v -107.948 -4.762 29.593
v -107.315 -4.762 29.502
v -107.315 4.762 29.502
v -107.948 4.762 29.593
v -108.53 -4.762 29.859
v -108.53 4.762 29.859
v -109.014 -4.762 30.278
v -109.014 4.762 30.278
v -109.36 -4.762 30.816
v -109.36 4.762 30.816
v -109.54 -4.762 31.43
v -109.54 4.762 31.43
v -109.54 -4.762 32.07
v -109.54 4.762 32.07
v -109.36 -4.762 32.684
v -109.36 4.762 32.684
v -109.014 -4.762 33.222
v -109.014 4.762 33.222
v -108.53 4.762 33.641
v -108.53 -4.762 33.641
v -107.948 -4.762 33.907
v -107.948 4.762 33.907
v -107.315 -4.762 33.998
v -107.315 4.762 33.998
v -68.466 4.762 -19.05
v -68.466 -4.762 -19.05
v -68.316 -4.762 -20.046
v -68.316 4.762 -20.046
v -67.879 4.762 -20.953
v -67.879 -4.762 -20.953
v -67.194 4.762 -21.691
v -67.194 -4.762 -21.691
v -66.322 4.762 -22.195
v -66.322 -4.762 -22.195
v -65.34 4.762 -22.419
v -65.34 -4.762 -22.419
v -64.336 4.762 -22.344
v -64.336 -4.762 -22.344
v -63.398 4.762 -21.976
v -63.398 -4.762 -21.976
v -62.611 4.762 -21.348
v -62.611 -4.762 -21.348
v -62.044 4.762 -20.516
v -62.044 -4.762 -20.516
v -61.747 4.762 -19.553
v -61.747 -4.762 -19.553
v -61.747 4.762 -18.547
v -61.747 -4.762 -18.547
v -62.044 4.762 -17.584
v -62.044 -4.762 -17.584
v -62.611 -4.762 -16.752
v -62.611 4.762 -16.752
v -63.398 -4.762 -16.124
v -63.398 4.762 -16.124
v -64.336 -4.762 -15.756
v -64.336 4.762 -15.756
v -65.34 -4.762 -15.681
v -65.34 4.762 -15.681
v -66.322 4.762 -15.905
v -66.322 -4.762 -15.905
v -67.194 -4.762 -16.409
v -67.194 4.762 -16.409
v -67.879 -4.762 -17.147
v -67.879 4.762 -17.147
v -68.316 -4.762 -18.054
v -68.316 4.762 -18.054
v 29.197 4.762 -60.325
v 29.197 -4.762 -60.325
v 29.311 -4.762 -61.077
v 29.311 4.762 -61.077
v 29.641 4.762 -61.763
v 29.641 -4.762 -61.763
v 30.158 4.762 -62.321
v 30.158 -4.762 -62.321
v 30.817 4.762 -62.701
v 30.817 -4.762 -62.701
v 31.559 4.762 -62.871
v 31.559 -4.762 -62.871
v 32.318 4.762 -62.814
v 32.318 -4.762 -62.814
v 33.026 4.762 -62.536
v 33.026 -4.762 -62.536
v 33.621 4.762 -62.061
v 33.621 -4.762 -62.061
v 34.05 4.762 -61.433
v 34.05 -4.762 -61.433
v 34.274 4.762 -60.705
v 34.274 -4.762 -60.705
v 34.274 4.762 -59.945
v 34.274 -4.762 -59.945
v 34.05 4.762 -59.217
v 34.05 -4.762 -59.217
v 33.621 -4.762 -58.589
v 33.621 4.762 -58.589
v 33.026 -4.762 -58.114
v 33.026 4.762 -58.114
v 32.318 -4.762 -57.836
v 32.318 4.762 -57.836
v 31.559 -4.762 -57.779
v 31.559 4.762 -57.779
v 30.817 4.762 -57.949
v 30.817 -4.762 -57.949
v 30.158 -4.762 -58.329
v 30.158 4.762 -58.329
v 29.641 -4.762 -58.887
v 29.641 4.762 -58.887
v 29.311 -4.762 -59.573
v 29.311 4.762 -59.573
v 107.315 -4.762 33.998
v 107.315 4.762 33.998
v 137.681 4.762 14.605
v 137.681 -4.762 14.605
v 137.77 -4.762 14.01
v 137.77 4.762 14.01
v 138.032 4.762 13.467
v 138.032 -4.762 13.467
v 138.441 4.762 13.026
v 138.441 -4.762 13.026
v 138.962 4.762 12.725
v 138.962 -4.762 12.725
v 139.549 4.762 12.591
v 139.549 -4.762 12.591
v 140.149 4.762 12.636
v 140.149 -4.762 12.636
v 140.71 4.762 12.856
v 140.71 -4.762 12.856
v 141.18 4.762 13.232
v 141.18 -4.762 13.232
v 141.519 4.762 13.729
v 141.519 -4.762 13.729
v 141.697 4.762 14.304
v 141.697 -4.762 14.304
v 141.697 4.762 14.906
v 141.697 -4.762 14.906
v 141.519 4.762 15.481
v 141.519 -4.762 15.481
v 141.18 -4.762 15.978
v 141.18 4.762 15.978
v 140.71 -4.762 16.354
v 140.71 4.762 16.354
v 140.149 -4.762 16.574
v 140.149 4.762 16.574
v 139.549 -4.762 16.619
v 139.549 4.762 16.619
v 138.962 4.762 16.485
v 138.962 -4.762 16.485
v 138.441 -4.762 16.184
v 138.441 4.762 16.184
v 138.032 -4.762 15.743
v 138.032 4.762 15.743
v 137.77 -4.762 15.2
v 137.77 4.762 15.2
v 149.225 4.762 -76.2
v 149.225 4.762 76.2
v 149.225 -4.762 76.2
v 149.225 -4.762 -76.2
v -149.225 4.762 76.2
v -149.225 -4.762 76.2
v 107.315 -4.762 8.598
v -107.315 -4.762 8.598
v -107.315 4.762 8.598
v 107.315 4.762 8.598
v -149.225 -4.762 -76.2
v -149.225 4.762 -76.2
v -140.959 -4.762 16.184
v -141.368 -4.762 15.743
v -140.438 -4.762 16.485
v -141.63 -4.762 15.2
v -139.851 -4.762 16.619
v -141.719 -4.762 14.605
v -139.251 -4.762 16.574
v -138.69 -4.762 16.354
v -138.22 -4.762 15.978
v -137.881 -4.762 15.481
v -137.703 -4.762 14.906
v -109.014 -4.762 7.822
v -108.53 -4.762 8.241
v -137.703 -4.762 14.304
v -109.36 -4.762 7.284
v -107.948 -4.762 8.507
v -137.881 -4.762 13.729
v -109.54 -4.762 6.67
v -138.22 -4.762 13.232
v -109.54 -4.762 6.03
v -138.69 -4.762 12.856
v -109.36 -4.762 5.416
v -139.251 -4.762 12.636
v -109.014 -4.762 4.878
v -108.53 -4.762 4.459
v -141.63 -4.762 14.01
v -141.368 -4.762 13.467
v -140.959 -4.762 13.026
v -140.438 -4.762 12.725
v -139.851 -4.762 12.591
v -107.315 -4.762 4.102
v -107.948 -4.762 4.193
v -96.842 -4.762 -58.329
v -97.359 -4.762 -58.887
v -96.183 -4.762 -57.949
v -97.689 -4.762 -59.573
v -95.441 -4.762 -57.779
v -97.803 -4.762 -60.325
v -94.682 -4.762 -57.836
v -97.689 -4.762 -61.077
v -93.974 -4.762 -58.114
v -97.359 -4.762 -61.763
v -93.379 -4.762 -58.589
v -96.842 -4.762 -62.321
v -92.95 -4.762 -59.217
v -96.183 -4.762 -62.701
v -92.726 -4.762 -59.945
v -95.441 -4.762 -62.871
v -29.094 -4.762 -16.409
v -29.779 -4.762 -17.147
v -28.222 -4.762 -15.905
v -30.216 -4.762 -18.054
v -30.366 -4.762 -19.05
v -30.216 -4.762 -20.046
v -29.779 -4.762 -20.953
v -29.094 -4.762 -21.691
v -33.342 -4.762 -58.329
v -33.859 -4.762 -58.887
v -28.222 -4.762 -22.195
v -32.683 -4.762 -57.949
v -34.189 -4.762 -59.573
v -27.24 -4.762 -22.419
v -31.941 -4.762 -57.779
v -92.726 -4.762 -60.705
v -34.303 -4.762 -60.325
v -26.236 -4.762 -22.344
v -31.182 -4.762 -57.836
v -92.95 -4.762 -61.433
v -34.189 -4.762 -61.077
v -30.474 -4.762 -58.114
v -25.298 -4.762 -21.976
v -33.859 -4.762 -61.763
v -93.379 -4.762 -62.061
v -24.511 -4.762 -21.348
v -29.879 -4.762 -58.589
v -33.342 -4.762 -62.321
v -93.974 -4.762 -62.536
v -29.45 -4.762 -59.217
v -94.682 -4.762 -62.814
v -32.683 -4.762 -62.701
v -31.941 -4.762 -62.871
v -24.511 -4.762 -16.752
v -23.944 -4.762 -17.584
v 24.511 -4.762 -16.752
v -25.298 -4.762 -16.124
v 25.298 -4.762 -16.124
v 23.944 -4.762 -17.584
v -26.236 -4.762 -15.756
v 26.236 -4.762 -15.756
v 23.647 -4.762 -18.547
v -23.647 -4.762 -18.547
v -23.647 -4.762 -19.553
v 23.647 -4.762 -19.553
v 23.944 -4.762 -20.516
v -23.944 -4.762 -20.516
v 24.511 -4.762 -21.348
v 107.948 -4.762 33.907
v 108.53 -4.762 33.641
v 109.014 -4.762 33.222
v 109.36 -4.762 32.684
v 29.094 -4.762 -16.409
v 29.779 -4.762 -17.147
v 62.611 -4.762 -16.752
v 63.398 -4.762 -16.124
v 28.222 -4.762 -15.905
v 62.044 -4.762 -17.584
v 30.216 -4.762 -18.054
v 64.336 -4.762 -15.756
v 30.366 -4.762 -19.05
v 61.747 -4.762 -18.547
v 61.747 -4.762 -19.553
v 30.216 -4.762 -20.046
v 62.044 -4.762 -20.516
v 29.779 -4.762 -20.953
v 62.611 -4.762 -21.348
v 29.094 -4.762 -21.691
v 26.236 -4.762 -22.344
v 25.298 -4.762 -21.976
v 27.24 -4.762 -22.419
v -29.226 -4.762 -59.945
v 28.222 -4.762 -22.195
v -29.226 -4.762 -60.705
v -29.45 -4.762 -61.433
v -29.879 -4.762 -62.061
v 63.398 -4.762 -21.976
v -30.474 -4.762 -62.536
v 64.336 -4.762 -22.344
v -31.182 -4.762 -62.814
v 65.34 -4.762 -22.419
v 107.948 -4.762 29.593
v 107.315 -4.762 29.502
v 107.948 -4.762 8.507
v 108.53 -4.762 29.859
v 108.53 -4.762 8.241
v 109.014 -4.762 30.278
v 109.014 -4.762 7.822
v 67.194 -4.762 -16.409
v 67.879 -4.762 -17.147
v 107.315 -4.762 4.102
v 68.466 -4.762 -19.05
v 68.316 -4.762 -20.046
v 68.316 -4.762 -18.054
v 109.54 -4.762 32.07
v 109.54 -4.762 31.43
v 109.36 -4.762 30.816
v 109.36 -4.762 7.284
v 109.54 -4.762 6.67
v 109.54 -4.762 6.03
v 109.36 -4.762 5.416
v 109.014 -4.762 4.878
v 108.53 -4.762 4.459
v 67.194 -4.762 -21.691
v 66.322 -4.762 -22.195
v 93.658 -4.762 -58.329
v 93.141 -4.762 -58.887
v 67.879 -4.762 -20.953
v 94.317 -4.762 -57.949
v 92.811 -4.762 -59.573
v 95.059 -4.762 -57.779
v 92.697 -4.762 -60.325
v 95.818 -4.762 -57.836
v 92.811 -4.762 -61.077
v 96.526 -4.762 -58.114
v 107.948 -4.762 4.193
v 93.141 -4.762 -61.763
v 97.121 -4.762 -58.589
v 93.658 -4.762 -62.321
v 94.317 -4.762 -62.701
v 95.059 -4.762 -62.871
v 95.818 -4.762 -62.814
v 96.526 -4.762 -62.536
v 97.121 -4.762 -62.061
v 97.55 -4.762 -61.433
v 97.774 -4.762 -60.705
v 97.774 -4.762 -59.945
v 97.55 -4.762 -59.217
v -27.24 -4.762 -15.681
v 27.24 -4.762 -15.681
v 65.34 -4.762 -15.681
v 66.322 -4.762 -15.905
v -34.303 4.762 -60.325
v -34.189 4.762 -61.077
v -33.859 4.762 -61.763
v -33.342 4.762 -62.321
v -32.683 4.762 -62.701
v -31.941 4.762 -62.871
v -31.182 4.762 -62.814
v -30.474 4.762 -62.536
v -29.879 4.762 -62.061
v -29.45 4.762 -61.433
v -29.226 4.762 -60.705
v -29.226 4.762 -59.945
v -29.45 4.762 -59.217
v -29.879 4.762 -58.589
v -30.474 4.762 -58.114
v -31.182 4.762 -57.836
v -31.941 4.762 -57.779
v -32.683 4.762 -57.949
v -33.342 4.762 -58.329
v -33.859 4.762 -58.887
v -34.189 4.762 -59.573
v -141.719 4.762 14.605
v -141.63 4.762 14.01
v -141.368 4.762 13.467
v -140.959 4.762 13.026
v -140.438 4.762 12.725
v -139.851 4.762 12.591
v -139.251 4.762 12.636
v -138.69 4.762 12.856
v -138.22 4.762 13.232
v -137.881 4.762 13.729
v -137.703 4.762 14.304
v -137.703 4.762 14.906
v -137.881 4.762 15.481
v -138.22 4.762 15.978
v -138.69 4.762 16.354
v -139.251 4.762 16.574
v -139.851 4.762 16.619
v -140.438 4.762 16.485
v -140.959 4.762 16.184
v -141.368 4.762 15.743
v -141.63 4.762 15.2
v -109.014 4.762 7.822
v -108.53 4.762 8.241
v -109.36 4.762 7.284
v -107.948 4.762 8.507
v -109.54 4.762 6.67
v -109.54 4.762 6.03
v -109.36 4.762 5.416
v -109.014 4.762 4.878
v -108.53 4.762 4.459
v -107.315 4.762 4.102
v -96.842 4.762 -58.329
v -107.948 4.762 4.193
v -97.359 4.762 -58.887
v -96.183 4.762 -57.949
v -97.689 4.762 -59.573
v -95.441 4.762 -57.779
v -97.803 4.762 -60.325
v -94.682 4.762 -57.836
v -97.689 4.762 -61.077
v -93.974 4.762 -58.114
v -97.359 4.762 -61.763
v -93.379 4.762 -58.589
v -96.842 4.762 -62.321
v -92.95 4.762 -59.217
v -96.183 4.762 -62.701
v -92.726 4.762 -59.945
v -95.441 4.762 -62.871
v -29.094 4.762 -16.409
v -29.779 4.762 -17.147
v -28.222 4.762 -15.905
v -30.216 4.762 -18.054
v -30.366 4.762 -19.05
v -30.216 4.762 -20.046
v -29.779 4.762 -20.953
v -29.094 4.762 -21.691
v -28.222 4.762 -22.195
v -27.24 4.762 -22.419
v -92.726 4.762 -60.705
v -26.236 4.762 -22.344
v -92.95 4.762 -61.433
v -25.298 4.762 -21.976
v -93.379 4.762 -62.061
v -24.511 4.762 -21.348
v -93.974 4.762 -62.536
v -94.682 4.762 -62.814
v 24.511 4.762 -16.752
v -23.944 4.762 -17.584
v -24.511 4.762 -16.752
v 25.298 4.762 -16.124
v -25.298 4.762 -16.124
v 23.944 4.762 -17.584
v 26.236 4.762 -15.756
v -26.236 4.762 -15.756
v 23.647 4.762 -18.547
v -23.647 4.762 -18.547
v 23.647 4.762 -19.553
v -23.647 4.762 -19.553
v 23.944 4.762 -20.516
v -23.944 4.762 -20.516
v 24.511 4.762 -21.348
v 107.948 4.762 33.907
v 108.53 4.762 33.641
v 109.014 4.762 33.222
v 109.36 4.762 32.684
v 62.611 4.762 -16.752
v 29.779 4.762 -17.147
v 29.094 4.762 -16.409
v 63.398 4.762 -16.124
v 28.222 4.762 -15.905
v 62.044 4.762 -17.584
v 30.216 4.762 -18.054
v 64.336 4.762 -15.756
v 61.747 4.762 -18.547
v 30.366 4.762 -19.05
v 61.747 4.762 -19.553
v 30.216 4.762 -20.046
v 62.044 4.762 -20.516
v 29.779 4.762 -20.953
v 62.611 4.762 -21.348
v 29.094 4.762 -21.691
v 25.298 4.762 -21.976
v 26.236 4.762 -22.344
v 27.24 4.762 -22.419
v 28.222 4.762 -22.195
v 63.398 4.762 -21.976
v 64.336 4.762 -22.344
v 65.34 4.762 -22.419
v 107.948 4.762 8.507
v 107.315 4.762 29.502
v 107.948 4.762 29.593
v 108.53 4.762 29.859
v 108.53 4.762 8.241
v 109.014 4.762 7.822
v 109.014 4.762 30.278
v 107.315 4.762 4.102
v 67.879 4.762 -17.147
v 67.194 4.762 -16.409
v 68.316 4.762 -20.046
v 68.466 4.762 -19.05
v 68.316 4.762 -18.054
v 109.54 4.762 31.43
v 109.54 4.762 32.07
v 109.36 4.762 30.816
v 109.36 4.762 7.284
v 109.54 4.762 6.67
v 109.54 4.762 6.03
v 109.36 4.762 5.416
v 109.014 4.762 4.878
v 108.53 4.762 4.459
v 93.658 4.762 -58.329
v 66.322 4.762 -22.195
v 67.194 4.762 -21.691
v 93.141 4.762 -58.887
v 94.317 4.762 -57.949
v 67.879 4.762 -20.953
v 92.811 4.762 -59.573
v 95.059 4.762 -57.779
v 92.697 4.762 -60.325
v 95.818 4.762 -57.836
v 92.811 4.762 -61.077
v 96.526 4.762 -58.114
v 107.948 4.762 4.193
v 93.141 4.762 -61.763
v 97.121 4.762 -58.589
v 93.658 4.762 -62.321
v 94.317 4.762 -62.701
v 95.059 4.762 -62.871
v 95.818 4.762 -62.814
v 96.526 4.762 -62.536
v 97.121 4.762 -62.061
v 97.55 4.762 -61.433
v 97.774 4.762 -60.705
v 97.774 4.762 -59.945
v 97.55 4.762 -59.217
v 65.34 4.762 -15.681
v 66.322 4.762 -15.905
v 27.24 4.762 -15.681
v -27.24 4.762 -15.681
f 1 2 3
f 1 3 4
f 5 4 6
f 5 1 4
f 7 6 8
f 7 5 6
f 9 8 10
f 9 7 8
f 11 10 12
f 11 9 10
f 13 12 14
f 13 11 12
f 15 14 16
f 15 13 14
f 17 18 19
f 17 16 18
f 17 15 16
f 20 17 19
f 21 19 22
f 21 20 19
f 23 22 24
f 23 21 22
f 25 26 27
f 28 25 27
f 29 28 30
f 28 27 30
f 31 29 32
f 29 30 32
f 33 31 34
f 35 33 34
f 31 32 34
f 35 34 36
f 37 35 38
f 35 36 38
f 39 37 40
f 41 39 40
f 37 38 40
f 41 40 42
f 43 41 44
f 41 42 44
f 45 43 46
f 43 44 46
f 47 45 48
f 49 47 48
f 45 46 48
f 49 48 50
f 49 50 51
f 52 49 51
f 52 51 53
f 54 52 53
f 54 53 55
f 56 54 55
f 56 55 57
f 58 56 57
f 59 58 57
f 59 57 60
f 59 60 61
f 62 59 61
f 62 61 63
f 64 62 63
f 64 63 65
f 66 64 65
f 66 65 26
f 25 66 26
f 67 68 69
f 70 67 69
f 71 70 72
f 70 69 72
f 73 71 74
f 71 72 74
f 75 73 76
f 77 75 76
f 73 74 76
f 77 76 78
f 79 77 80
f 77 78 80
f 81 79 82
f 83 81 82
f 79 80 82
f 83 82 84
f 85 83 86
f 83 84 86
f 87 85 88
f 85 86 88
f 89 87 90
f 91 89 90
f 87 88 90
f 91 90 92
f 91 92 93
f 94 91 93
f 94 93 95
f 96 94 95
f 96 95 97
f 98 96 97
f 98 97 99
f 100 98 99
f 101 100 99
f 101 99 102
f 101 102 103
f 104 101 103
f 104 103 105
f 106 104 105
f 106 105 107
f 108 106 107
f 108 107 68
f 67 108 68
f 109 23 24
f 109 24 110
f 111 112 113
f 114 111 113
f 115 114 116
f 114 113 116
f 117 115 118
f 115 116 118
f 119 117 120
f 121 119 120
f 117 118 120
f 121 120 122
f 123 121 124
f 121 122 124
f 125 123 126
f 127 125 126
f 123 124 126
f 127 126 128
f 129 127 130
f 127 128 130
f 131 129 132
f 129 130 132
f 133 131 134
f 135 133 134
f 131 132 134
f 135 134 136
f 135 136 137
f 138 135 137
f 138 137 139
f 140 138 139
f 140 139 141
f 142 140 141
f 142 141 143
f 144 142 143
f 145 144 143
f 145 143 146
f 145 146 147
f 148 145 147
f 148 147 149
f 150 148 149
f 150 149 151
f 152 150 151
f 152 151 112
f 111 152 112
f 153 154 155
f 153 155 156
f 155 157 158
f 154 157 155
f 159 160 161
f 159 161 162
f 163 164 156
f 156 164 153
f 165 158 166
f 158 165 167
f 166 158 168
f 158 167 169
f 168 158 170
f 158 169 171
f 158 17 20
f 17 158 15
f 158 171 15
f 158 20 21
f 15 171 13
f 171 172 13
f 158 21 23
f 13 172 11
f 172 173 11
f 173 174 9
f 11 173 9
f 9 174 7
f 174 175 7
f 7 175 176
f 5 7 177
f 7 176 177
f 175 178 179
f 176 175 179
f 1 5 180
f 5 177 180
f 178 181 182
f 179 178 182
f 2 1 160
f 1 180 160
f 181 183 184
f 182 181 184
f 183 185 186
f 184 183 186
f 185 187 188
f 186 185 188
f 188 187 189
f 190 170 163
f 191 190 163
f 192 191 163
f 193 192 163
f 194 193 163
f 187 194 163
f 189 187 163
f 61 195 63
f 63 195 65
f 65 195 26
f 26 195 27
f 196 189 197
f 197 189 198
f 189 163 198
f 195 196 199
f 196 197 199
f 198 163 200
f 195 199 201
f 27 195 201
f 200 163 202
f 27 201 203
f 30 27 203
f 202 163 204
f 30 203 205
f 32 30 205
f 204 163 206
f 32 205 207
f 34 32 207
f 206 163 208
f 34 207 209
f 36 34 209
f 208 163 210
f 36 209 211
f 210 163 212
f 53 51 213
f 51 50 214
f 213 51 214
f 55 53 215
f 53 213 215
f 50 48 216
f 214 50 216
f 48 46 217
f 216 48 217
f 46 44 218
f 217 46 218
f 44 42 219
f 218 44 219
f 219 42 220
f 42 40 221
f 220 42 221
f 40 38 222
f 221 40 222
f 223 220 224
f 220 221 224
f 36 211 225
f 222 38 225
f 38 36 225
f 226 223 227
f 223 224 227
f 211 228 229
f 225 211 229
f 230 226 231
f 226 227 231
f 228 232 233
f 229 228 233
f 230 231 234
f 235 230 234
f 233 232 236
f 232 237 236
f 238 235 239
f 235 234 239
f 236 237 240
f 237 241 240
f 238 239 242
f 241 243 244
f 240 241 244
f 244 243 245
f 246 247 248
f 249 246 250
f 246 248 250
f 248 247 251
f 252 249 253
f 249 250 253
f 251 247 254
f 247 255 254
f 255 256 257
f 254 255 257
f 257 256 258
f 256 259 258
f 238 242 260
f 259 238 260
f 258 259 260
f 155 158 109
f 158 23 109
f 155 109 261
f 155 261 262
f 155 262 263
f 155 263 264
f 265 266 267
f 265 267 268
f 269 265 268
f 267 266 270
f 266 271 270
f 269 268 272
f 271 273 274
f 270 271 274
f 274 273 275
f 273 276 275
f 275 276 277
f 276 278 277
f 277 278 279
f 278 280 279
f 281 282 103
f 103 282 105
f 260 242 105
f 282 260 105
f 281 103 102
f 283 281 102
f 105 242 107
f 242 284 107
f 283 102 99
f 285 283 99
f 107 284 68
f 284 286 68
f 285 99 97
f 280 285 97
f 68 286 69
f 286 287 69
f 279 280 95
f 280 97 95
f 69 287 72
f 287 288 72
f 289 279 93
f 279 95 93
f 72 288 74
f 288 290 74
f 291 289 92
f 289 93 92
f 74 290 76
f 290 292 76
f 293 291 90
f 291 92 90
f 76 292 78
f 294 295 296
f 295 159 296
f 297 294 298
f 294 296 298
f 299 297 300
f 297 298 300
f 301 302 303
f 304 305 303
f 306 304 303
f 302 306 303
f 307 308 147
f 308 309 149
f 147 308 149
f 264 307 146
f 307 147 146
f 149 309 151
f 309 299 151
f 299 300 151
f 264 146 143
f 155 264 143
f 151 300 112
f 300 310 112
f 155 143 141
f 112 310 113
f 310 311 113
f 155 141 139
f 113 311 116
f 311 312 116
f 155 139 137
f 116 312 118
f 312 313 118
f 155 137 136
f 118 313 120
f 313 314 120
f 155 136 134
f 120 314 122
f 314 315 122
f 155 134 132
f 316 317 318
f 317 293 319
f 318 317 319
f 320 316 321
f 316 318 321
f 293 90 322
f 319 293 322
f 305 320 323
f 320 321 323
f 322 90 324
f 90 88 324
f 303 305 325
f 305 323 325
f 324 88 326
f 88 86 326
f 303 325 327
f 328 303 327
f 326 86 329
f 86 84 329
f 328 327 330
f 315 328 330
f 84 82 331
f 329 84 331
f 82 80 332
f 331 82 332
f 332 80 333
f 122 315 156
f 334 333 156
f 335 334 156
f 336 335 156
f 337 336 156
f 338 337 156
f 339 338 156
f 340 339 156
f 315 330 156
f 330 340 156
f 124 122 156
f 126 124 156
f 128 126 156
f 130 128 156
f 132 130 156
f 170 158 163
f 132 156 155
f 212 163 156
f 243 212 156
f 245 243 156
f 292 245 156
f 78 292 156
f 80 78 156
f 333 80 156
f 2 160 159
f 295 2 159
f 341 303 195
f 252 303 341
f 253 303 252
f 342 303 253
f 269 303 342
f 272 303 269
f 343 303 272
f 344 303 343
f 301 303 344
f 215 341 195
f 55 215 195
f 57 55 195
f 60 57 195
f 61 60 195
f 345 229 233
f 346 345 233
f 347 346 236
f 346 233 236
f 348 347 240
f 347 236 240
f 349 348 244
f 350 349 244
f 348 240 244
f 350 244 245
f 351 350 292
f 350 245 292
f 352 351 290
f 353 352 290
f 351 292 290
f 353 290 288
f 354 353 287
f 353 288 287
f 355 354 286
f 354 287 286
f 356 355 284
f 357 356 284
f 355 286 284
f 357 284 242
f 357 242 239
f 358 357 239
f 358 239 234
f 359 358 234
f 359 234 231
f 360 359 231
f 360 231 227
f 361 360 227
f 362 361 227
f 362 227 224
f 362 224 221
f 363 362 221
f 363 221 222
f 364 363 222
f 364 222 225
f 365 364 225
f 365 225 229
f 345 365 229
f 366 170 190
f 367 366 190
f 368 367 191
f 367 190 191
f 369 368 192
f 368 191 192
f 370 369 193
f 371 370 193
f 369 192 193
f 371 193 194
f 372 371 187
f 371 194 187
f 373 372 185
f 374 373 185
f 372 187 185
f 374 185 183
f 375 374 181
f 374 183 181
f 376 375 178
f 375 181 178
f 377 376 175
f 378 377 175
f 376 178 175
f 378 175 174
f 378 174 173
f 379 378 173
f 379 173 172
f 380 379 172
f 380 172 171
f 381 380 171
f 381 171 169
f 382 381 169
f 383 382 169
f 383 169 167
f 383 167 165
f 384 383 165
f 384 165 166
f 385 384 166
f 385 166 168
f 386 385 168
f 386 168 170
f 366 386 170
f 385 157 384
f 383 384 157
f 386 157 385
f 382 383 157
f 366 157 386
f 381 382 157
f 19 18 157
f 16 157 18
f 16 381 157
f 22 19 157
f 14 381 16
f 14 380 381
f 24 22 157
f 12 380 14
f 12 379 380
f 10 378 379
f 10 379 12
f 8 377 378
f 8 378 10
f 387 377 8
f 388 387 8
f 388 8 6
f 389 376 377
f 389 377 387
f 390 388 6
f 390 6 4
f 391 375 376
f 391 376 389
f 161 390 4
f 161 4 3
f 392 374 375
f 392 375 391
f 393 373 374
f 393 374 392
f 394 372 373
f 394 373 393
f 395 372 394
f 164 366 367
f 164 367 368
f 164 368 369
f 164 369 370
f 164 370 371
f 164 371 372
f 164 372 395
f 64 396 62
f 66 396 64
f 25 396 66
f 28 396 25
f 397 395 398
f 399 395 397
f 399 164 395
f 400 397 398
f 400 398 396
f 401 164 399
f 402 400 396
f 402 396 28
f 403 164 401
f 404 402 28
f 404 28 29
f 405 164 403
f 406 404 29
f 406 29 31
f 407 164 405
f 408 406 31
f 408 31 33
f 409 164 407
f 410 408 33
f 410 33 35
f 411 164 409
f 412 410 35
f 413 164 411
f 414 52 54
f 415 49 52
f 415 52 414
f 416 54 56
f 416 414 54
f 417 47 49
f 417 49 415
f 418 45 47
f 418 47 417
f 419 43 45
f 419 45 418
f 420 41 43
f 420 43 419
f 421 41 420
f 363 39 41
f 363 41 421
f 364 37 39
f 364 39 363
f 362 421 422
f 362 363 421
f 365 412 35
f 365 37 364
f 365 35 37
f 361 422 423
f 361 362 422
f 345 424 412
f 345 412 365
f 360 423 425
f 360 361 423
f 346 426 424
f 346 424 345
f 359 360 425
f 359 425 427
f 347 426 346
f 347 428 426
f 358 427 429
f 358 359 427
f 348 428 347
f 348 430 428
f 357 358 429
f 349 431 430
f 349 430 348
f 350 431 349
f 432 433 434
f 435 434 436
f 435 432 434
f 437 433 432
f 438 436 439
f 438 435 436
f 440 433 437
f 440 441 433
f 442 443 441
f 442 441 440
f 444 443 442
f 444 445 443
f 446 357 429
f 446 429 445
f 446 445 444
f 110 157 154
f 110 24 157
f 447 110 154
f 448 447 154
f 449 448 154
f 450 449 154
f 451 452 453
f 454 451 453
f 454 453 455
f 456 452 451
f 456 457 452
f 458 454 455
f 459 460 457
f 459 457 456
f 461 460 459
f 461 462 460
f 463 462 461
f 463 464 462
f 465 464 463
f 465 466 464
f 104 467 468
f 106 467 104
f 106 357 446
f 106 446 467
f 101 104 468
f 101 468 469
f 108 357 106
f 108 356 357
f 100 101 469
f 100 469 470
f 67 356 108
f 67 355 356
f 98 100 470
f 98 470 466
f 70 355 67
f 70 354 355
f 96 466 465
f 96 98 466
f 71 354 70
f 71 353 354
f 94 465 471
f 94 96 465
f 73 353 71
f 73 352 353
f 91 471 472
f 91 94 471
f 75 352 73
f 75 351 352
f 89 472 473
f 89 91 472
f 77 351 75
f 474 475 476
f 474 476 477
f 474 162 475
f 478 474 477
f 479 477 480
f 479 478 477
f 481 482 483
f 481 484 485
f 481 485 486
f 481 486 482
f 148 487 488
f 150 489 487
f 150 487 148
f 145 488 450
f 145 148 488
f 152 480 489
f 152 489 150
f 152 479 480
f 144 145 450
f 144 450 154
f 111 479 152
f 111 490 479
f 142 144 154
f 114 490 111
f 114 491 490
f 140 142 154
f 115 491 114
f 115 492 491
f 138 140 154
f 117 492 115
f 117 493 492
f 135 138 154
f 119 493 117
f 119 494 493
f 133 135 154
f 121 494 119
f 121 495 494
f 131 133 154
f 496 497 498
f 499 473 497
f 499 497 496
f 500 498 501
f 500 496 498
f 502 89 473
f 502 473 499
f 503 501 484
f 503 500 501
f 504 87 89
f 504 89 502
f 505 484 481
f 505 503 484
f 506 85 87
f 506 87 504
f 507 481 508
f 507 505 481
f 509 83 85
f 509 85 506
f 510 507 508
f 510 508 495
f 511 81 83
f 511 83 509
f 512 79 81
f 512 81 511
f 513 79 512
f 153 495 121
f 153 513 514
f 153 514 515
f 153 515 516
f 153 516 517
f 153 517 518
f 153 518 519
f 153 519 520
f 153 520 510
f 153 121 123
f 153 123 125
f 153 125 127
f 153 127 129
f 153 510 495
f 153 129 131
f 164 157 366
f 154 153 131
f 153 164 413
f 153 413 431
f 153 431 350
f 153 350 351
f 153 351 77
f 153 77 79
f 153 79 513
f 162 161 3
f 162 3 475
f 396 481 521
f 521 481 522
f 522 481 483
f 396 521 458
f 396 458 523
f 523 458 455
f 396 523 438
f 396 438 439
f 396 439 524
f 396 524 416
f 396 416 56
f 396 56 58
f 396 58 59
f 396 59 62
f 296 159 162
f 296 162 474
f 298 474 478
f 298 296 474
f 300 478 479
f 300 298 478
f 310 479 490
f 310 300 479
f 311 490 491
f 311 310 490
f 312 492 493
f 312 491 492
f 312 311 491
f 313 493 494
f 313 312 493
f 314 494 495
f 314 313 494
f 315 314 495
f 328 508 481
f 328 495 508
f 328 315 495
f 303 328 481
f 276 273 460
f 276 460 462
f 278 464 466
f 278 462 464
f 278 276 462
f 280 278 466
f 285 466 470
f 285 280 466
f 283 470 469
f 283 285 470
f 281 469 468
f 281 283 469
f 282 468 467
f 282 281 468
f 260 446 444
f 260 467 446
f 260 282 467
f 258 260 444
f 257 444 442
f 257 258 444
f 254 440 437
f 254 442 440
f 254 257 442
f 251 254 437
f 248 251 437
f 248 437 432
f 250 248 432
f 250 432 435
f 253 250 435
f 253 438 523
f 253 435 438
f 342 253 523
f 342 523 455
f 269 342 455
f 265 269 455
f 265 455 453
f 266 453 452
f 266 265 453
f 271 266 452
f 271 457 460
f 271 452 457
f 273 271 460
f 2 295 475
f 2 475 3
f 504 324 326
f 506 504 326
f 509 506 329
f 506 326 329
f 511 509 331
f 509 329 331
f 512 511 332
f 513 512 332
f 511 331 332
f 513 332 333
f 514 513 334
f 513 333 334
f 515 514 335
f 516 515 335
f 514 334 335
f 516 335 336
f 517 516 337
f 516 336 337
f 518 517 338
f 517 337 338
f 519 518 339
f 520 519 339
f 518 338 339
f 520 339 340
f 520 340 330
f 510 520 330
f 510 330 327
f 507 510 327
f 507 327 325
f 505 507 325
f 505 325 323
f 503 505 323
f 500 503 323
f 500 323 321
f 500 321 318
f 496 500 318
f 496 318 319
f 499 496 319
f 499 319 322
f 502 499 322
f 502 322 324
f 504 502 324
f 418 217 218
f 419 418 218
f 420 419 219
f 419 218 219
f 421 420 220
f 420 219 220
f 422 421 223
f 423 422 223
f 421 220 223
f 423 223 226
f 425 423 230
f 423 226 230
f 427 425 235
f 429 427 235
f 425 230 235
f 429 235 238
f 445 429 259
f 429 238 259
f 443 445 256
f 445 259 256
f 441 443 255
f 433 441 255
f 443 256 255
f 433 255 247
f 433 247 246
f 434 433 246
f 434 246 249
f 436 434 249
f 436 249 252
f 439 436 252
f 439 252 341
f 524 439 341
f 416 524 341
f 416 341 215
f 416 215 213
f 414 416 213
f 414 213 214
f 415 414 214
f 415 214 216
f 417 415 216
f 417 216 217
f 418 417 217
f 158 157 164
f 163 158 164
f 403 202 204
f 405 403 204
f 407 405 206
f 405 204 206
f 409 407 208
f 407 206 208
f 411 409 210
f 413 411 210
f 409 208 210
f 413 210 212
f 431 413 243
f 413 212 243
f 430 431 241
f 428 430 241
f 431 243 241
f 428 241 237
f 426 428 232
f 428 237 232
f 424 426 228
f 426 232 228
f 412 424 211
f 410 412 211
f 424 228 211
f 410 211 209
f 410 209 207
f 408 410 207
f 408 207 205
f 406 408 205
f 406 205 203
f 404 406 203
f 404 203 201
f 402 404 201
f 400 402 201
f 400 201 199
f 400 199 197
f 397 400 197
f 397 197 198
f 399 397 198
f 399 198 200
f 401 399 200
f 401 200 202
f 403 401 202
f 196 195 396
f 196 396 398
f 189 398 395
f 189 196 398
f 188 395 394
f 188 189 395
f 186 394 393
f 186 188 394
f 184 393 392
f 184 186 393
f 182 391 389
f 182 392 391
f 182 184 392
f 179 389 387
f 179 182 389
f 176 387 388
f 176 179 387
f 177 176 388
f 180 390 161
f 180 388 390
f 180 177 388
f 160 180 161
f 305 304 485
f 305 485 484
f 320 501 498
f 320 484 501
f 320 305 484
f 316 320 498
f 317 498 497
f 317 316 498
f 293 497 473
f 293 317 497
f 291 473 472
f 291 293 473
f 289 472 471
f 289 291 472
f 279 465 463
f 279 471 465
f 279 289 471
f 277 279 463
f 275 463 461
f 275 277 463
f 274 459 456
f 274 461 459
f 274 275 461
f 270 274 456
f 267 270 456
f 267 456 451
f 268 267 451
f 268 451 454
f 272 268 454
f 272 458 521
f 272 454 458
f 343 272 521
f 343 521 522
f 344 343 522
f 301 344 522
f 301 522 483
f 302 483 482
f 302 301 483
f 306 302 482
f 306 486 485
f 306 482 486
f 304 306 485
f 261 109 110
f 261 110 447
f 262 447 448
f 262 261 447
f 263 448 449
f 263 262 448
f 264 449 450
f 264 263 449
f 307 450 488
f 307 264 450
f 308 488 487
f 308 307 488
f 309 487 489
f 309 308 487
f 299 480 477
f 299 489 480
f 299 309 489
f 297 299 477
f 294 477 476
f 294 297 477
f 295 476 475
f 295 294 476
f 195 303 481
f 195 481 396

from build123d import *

# Parameters (mm, degrees)
SKETCH1_W               = 298.45
SKETCH1_H               = 152.4
BOSS_EXTRUDE1_DEPTH     = 4.7625
CUT_EXTRUDE2_DEPTH      = 168.825106137
F_10_CLEARANCE_HOLE3_D  = 5.1054
LPATTERN2_COUNT         = 4
LPATTERN2_PITCH         = 63.5
F_10_32_TAPPED_HOLE1_D  = 4.0386
F_1_4_CLEARANCE_HOLE1_D = 6.7564


with BuildPart() as part:
    # Sketch1 → Boss-Extrude1 (new, symmetric)
    with BuildSketch(Plane(origin=(0, 0, 0), x_dir=(1, 0, 0), z_dir=(0, 1, 0))):
        Rectangle(SKETCH1_W, SKETCH1_H)
    extrude(amount=BOSS_EXTRUDE1_DEPTH, both=True)

    # Sketch4 → Cut-Extrude2 (cut, through all)
    with BuildSketch(Plane.XZ.offset(4.7625)):
        with BuildLine():
            Line((-107.315, 33.9979), (107.315, 33.9979))
            ThreePointArc((107.315, 33.9979), (109.5629, 31.75), (107.315, 29.5021))
            Line((107.315, 29.5021), (-107.315, 29.5021))
            ThreePointArc((-107.315, 29.5021), (-109.5629, 31.75), (-107.315, 33.9979))
        make_face()
        with BuildLine():
            Line((-107.315, 8.5979), (107.315, 8.5979))
            ThreePointArc((107.315, 8.5979), (109.5629, 6.35), (107.315, 4.1021))
            Line((107.315, 4.1021), (-107.315, 4.1021))
            ThreePointArc((-107.315, 4.1021), (-109.5629, 6.35), (-107.315, 8.5979))
        make_face()
    extrude(amount=-CUT_EXTRUDE2_DEPTH, mode=Mode.SUBTRACT)

    # #10 Clearance Hole3 (through all)
    with Locations(Plane(origin=(0, 4.7625, 0), x_dir=(1, 0, 0), z_dir=(0, 1, 0))):
        with Locations((-95.25, 60.325)):
            f_10_clearance_hole3 = Hole(F_10_CLEARANCE_HOLE3_D / 2)

    # LPattern2: #10 Clearance Hole3 ×4
    with Locations(*[(i * LPATTERN2_PITCH, 0, 0) for i in range(1, LPATTERN2_COUNT)]):
        add(f_10_clearance_hole3, mode=Mode.SUBTRACT)

    # #10-32 Tapped Hole1 (through all)
    with Locations(Plane(origin=(0, 4.7625, 0), x_dir=(1, 0, 0), z_dir=(0, 1, 0))):
        with Locations((-139.7, -14.605), (139.7, -14.605)):
            Hole(F_10_32_TAPPED_HOLE1_D / 2)

    # 1/4 Clearance Hole1 (through all)
    with Locations(Plane(origin=(0, 4.7625, 0), x_dir=(1, 0, 0), z_dir=(0, 1, 0))):
        with Locations((-65.0875, 19.05), (-26.9875, 19.05)):
            f_1_4_clearance_hole1 = Hole(F_1_4_CLEARANCE_HOLE1_D / 2)

    # Mirror5: 1/4 Clearance Hole1 across plane
    add(f_1_4_clearance_hole1.mirror(Plane(origin=(0, 0, 0), x_dir=(0, 0, 1), z_dir=(1, 0, 0))), mode=Mode.SUBTRACT)


solid = part.part
